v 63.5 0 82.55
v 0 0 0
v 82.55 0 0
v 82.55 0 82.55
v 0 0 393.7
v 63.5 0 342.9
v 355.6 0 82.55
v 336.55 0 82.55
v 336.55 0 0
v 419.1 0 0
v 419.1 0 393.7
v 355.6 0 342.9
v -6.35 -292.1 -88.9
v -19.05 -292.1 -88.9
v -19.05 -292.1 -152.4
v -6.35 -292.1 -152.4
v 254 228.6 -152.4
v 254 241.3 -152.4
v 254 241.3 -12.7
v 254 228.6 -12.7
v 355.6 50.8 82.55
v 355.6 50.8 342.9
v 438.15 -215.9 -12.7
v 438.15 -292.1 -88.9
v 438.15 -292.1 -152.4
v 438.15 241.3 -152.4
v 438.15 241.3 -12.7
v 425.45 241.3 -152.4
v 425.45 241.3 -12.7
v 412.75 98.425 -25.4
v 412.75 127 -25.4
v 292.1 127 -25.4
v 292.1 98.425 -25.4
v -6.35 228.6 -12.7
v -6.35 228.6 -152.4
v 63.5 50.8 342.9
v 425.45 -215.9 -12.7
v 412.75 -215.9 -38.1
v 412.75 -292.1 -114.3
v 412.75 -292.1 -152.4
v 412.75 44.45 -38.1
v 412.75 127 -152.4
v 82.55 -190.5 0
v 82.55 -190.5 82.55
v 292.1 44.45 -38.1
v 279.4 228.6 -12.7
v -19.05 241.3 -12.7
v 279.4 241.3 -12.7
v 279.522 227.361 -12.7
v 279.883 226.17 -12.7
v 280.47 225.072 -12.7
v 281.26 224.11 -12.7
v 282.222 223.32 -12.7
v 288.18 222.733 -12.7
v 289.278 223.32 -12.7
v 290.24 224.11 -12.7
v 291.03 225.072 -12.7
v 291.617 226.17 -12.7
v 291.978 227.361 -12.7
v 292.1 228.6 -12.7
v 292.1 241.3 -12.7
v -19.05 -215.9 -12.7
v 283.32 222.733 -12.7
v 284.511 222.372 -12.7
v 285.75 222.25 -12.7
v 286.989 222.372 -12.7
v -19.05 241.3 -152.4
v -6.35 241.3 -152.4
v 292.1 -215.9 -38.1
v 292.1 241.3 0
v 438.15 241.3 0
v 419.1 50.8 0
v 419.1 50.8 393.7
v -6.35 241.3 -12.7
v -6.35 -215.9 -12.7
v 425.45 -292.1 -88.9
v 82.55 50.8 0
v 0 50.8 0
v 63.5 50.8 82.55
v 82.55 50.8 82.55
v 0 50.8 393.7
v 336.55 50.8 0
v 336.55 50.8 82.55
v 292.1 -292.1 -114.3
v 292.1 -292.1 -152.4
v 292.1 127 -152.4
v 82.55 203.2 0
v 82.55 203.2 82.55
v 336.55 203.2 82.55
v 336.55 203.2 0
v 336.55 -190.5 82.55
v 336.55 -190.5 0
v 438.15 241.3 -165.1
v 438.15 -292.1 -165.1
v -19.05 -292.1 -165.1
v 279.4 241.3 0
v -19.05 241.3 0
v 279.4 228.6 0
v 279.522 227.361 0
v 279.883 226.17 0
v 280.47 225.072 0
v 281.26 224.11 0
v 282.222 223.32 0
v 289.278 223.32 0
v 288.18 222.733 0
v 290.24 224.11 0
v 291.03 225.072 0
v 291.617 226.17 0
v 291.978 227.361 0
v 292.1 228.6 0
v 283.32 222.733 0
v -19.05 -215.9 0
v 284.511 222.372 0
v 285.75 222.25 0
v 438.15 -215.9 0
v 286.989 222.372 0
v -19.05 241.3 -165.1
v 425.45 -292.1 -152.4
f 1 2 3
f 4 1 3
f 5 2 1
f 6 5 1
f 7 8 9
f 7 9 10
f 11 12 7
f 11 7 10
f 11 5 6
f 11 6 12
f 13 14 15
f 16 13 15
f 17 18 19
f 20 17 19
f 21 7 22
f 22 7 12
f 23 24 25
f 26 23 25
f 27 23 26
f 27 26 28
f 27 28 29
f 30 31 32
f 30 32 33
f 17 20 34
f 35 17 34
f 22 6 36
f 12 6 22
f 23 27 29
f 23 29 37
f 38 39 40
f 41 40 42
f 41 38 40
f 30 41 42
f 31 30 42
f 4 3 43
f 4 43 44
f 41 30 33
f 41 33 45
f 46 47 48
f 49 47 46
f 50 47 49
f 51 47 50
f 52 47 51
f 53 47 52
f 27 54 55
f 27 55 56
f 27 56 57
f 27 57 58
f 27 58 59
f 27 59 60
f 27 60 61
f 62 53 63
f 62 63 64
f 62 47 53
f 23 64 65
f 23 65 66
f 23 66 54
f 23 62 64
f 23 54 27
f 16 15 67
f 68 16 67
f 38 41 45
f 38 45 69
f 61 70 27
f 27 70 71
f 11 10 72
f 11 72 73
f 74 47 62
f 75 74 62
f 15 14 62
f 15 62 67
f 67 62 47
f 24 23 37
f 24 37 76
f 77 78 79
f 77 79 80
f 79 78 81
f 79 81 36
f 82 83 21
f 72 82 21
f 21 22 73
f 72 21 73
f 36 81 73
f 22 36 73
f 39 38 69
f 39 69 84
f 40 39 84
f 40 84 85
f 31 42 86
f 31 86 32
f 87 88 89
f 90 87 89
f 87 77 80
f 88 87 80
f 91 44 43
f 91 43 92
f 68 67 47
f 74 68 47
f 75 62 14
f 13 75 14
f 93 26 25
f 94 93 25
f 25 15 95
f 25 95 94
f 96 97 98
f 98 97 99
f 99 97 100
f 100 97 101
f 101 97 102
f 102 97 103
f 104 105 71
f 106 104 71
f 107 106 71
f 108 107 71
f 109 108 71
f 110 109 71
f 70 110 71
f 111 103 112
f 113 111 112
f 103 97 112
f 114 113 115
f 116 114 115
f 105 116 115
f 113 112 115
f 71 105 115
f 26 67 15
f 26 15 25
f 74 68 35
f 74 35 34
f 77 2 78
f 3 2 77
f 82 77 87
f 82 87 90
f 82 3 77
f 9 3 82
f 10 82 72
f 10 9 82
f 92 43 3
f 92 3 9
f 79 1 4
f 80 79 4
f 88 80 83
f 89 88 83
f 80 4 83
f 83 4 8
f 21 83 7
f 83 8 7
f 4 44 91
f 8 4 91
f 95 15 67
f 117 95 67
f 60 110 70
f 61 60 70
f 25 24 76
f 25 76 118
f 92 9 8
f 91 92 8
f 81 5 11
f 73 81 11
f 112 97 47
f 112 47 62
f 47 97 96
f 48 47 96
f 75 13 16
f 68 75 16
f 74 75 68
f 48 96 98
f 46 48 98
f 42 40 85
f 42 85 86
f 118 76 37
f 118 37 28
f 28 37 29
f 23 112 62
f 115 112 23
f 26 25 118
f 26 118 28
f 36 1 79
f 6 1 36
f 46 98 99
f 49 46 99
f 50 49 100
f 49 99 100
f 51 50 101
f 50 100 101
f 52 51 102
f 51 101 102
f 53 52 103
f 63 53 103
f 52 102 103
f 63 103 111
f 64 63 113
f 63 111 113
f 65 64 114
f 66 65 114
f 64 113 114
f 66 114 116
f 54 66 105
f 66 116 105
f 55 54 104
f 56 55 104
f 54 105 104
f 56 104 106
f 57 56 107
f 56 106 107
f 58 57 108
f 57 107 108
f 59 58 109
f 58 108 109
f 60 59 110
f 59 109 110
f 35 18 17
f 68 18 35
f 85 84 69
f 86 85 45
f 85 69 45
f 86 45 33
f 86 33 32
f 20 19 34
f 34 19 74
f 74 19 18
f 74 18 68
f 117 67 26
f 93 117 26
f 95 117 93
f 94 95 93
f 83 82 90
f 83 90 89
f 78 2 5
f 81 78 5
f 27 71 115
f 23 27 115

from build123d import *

# Parameters (mm, degrees)
F0_W      = 419.1
F0_H      = 393.7
F0_W_2    = 292.1
F0_H_2    = 260.35
F1_DEPTH  = 50.8
F2_W      = 254
F2_H      = 82.55
F3_DEPTH  = 190.5
F4_DEPTH  = 393.7
F5_W      = 457.2
F5_H      = 457.2
F6_DEPTH  = 12.7
F8_W      = 457.2
F8_H      = 76.2
F8_H_2    = 457.2
F9_DEPTH  = 12.7
F12_DEPTH = 120.65
F14_DEPTH = 12.7
F17_W     = 260.35
F17_H     = 139.7
F18_DEPTH = 12.7
F20_DEPTH = 12.7


with BuildPart() as f1:
    # F0 (on Front) → F1 (new body)
    with BuildSketch(Plane.XZ):
        with Locations((209.55, 196.85)):
            Rectangle(F0_W, F0_H)
        with Locations((209.55, 212.725)):
            Rectangle(F0_W_2, F0_H_2, mode=Mode.SUBTRACT)
    extrude(amount=-F1_DEPTH)

    # F2 (on face) → F3 (join)
    with BuildSketch(Plane.XZ):
        with Locations((209.55, 41.275)):
            Rectangle(F2_W, F2_H)
    extrude(amount=F3_DEPTH)

    # F4 (add): a face of the model
    f4_faces = [f1.faces().sort_by_distance(p)[0] for p in [
        (209.55, -190.5, 41.275),
    ]]
    extrude(f4_faces, amount=-F4_DEPTH)


with BuildPart() as f6:
    # F5 (on face) → F6 (new body)
    with BuildSketch(Plane(origin=(0, 0, 0), x_dir=(1, 0, 0), z_dir=(0, 0, -1))):
        with Locations((209.55, -12.7)):
            Rectangle(F5_W, F5_H)
        Polygon((0, 0), (82.55, 0), (82.55, 190.5), (336.55, 190.5), (336.55, 0), (419.1, 0), (419.1, -50.8), (336.55, -50.8), (336.55, -203.2), (82.55, -203.2), (82.55, -50.8), (0, -50.8), align=None, mode=Mode.SUBTRACT)
        Polygon((82.55, 190.5), (82.55, 0), (0, 0), (0, -50.8), (82.55, -50.8), (82.55, -203.2), (336.55, -203.2), (336.55, -50.8), (419.1, -50.8), (419.1, 0), (336.55, 0), (336.55, 190.5), align=None)
    extrude(amount=F6_DEPTH)

    # F19 (on face) → F20 (cut, through all)
    with BuildSketch(Plane.XY):
        with BuildLine():
            ThreePointArc((279.4, 228.6), (285.75, 222.25), (292.1, 228.6))
            ThreePointArc((292.1, 228.6), (285.75, 234.95), (279.4, 228.6))
        make_face()
        with BuildLine():
            ThreePointArc((279.4, 228.6), (285.75, 234.95), (292.1, 228.6))
            Line((292.1, 228.6), (292.1, 241.3))
            Line((292.1, 241.3), (279.4, 241.3))
            Line((279.4, 241.3), (279.4, 228.6))
        make_face()
    extrude(amount=-F20_DEPTH, mode=Mode.SUBTRACT)


with BuildPart() as f9:
    # F8 (on offset) → F9 (new body)
    with BuildSketch(Plane(origin=(0, 0, -152.4), x_dir=(1, 0, 0), z_dir=(0, 0, -1))):
        with Locations((209.55, 254)):
            Rectangle(F8_W, F8_H)
        with Locations((209.55, -12.7)):
            Rectangle(F8_W, F8_H_2)
    extrude(amount=F9_DEPTH)


with BuildPart() as f12:
    # F11 (on offset) → F12 (new body)
    with BuildSketch(Plane.YZ.offset(412.75)):
        Polygon((-292.1, -152.4), (127, -152.4), (127, -25.4), (98.425, -25.4), (44.45, -38.1), (-215.9, -38.1), (-292.1, -114.3), align=None)
    extrude(amount=-F12_DEPTH)


with BuildPart() as f14:
    # F13 (on face) → F14 (new body)
    with BuildSketch(Plane.YZ.offset(438.15)):
        Polygon((241.3, -152.4), (241.3, -12.7), (-215.9, -12.7), (-292.1, -88.9), (-292.1, -152.4), align=None)
    extrude(amount=-F14_DEPTH)


with BuildPart() as f16_1:
    # F16: instance of F14
    add(f14.part.mirror(Plane(origin=(209.55, 12.7, -6.35), x_dir=(0, 1, 0), z_dir=(1, 0, 0))))


with BuildPart() as f18:
    # F17 (on face) → F18 (new body)
    with BuildSketch(Plane(origin=(0, 241.3, 0), x_dir=(-1, 0, 0), z_dir=(0, 1, 0))):
        with Locations((-123.825, -82.55)):
            Rectangle(F17_W, F17_H)
    extrude(amount=-F18_DEPTH)


solid = Compound([f1.part, f6.part, f9.part, f12.part, f14.part, f16_1.part, f18.part])
